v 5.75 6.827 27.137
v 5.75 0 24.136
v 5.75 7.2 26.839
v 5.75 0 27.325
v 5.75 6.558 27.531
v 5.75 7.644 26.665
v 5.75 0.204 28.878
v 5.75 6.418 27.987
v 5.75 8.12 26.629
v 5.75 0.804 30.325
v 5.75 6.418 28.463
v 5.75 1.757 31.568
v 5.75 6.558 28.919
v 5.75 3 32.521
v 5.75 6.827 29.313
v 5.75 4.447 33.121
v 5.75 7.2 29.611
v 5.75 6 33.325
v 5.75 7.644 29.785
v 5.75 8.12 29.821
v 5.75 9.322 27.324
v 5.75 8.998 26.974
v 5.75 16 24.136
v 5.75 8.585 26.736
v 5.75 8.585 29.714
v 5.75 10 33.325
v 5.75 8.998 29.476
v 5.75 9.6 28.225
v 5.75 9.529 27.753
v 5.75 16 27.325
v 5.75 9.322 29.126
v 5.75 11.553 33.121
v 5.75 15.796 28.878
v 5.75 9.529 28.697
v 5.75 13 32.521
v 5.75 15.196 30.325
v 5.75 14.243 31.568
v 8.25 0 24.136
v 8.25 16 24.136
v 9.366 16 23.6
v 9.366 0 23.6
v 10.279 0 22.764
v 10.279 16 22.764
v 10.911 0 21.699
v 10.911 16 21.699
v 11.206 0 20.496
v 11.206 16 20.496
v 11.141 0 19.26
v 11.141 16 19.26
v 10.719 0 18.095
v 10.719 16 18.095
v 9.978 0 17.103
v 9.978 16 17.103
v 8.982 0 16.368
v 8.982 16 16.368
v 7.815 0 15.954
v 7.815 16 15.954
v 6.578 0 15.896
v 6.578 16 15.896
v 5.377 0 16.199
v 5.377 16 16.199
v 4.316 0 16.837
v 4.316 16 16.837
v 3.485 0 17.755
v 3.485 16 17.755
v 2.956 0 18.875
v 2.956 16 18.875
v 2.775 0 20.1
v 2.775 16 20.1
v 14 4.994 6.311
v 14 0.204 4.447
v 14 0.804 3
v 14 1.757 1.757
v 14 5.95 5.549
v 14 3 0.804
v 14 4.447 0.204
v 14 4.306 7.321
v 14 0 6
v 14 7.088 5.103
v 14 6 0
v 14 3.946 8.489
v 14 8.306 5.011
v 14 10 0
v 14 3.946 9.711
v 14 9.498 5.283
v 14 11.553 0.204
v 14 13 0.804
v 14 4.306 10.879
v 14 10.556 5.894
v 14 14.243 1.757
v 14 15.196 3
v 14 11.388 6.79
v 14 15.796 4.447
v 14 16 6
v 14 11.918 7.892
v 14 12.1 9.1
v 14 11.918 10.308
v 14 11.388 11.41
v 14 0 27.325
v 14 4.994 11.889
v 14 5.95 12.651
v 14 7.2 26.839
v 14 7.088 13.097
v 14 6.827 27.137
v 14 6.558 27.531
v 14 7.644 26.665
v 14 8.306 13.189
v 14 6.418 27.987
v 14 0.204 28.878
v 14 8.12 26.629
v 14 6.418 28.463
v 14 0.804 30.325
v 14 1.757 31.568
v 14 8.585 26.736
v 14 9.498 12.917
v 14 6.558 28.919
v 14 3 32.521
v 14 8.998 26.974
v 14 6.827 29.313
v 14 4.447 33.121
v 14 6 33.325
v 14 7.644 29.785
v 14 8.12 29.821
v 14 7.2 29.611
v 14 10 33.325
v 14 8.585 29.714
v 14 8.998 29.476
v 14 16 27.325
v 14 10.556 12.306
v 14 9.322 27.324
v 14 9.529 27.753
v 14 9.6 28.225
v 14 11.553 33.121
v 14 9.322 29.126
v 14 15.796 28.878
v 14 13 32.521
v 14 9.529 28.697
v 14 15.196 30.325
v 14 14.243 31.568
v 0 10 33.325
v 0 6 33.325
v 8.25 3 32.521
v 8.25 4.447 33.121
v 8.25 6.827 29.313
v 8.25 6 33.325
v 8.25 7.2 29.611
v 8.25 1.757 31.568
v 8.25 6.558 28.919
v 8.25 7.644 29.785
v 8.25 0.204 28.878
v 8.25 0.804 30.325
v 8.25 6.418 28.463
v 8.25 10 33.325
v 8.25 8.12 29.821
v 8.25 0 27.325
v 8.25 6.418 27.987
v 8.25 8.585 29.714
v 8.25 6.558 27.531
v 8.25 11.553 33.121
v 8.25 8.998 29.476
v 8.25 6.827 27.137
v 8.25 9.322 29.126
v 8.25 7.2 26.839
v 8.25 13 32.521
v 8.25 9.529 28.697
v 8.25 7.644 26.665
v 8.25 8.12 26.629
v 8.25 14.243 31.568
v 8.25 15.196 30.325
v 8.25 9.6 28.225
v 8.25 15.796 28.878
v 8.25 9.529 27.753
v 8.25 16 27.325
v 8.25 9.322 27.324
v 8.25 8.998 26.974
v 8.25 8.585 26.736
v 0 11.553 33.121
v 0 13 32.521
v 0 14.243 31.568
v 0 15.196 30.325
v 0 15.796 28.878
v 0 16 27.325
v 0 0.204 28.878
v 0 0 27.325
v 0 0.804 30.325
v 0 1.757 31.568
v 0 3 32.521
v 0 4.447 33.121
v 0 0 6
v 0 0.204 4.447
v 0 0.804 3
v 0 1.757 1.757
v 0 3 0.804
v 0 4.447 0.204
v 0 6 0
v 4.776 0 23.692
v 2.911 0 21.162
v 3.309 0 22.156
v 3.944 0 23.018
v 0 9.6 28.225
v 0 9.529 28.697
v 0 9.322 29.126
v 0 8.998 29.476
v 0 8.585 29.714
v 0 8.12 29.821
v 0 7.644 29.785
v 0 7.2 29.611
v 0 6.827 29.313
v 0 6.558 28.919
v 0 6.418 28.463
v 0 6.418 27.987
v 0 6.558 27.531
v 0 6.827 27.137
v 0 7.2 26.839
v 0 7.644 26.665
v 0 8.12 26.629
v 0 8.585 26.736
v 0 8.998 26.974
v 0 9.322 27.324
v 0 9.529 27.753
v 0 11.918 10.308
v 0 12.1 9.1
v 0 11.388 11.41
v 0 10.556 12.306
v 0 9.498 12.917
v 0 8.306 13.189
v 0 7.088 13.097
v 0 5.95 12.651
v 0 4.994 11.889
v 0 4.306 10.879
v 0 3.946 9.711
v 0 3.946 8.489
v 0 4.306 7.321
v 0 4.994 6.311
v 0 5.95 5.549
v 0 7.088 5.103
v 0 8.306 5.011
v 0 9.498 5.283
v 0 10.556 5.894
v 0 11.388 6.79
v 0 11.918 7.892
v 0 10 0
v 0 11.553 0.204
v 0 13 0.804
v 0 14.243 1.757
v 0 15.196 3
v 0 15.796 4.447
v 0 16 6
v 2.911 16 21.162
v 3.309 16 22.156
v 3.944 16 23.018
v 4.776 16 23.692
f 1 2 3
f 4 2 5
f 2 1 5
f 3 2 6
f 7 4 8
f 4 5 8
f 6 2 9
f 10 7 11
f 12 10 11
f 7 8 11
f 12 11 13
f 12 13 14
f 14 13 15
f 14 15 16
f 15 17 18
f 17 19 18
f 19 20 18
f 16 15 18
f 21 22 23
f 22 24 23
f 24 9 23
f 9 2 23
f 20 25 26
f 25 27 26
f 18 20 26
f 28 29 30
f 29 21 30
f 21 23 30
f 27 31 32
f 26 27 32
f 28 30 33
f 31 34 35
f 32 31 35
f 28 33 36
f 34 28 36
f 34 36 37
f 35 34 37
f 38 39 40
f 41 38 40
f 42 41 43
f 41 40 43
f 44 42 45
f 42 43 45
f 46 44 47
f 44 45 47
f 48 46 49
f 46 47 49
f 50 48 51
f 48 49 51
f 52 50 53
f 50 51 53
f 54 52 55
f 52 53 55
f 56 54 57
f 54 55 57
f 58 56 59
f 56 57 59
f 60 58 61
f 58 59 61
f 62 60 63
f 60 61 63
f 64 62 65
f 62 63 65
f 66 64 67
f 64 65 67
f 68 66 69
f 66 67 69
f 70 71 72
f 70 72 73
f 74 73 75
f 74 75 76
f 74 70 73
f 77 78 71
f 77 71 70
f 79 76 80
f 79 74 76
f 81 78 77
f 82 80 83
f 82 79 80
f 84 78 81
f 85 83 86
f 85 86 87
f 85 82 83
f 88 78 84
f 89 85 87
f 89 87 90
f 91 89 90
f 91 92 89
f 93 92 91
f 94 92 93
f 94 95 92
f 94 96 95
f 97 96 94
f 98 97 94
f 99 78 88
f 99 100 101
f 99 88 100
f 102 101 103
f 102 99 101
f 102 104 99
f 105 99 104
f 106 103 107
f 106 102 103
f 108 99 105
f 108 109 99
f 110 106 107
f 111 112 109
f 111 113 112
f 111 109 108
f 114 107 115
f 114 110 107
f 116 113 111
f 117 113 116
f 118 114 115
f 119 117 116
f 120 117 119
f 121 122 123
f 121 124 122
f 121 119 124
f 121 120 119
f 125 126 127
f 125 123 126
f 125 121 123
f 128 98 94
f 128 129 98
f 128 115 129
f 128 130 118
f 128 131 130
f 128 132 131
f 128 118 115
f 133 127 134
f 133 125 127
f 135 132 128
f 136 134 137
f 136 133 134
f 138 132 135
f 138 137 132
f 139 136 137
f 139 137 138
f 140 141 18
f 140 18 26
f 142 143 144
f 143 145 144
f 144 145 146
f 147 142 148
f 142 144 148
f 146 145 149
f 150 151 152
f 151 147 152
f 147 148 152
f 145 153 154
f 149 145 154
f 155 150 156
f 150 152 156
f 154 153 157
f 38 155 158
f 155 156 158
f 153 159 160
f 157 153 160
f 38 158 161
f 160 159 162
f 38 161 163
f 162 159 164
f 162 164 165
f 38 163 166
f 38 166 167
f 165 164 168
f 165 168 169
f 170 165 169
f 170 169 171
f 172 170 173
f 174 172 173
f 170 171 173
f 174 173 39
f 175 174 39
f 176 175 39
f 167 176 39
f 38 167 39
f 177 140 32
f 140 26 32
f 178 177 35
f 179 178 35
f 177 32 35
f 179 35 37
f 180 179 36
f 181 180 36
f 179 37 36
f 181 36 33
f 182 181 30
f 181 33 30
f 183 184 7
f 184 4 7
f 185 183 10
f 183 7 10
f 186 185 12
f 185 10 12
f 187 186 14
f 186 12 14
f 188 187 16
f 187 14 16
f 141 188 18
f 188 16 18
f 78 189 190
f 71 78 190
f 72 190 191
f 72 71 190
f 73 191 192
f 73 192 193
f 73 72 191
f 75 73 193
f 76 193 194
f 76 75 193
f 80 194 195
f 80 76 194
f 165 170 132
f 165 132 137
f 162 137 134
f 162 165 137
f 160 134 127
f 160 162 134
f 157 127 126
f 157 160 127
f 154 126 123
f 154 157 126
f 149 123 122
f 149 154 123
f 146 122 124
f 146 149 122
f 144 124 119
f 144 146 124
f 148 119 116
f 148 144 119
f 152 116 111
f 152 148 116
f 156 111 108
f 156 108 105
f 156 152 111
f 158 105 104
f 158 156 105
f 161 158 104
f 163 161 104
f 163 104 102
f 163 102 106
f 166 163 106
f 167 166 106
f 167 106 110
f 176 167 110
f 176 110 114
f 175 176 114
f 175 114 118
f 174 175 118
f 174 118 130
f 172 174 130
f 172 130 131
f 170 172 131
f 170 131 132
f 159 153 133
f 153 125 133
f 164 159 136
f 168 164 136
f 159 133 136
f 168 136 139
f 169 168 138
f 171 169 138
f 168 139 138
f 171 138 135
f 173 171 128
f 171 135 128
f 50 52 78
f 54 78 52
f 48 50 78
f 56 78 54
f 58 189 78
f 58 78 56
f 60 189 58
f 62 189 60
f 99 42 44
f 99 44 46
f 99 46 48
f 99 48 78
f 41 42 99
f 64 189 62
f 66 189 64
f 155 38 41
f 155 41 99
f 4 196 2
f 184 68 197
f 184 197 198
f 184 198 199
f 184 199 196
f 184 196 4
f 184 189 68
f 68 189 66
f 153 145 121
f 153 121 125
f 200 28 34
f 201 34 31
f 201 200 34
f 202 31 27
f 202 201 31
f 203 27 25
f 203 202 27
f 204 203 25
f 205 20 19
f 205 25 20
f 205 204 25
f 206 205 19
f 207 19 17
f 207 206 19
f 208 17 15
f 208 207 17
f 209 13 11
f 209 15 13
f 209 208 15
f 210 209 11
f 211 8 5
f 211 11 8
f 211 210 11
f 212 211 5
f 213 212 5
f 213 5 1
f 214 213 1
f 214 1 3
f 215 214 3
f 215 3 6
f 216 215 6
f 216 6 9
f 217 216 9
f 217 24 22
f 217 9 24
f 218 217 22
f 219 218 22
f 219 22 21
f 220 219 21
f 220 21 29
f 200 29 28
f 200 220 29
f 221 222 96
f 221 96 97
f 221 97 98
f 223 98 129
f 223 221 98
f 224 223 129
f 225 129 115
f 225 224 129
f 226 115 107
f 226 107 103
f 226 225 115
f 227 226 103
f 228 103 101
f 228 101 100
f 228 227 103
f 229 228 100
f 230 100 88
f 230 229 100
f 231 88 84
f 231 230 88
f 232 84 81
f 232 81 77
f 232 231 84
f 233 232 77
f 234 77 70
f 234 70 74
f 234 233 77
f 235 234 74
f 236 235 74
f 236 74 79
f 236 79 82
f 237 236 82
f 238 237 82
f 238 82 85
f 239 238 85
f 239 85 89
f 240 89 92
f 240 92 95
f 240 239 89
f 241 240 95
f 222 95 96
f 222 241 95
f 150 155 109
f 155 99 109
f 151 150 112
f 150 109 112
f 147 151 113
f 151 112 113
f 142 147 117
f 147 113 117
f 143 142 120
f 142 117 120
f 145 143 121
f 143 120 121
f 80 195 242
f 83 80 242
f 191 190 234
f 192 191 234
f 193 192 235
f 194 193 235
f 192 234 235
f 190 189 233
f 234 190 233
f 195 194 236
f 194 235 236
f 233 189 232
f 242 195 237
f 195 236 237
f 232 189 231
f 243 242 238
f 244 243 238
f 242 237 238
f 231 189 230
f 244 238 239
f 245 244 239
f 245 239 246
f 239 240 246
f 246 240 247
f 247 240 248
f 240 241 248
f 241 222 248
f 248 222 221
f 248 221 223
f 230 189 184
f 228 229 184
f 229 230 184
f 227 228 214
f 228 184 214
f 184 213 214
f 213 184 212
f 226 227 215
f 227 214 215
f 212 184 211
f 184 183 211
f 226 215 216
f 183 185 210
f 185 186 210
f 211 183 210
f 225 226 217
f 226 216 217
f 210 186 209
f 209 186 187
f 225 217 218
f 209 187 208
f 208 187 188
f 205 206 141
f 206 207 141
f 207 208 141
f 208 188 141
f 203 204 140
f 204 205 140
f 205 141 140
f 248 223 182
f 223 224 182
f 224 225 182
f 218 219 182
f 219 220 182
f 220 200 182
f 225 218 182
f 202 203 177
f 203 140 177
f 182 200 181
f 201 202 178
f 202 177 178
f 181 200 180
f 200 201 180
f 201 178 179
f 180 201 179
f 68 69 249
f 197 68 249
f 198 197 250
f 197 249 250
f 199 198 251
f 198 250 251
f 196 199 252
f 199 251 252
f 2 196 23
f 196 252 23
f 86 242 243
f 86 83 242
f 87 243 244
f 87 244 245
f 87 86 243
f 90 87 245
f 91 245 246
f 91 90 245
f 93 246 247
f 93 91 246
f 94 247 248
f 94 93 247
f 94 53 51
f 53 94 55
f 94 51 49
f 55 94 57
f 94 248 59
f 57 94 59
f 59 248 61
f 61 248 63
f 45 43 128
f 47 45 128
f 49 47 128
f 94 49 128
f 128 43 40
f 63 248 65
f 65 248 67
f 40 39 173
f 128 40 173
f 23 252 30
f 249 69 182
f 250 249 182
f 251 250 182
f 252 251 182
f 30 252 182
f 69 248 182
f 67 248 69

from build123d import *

# Parameters (mm, degrees)
F0_W     = 16
F0_H     = 33.325
F0_R     = 4.1
F0_R_2   = 4.225
F0_R_3   = 1.6
F1_DEPTH = 14
F3_DEPTH = 16
F4_R     = 6


with BuildPart() as f1:
    # F0 (on Right) → F1 (new body)
    with BuildSketch(Plane.YZ):
        with Locations((8, 16.6625)):
            Rectangle(F0_W, F0_H)
        with Locations((8, 9.1)):
            Circle(F0_R, mode=Mode.SUBTRACT)
        with Locations((8, 20.1)):
            Circle(F0_R_2, mode=Mode.SUBTRACT)
        with Locations((8, 28.225)):
            Circle(F0_R_3, mode=Mode.SUBTRACT)
        with Locations((8, 20.1)):
            Circle(F0_R_2)
    extrude(amount=F1_DEPTH)

    # F2 (on face) → F3 (cut, through all)
    with BuildSketch(Plane(origin=(0, 16, 0), x_dir=(-1, 0, 0), z_dir=(0, 1, 0))):
        with BuildLine():
            ThreePointArc((-8.25, 24.135855), (-9.506928, 16.699127), (-2.775, 20.1))
            ThreePointArc((-2.775, 20.1), (-3.599127, 22.606928), (-5.75, 24.135855))
            ThreePointArc((-5.75, 24.135855), (-7, 24.325), (-8.25, 24.135855))
        make_face()
        with BuildLine():
            ThreePointArc((-8.25, 24.135855), (-7, 24.325), (-5.75, 24.135855))
            Line((-5.75, 24.135855), (-5.75, 33.325))
            Line((-5.75, 33.325), (-8.25, 33.325))
            Line((-8.25, 33.325), (-8.25, 24.135855))
        make_face()
    extrude(amount=-F3_DEPTH, mode=Mode.SUBTRACT)

    # F4
    f4_edges = [f1.edges().sort_by_distance(p)[0] for p in [
        (7, 16, 0),
        (7, 0, 0),
        (11.125, 0, 33.325),
        (2.875, 0, 33.325),
        (11.125, 16, 33.325),
        (2.875, 16, 33.325),
    ]]
    fillet(f4_edges, radius=F4_R)


solid = f1.part
